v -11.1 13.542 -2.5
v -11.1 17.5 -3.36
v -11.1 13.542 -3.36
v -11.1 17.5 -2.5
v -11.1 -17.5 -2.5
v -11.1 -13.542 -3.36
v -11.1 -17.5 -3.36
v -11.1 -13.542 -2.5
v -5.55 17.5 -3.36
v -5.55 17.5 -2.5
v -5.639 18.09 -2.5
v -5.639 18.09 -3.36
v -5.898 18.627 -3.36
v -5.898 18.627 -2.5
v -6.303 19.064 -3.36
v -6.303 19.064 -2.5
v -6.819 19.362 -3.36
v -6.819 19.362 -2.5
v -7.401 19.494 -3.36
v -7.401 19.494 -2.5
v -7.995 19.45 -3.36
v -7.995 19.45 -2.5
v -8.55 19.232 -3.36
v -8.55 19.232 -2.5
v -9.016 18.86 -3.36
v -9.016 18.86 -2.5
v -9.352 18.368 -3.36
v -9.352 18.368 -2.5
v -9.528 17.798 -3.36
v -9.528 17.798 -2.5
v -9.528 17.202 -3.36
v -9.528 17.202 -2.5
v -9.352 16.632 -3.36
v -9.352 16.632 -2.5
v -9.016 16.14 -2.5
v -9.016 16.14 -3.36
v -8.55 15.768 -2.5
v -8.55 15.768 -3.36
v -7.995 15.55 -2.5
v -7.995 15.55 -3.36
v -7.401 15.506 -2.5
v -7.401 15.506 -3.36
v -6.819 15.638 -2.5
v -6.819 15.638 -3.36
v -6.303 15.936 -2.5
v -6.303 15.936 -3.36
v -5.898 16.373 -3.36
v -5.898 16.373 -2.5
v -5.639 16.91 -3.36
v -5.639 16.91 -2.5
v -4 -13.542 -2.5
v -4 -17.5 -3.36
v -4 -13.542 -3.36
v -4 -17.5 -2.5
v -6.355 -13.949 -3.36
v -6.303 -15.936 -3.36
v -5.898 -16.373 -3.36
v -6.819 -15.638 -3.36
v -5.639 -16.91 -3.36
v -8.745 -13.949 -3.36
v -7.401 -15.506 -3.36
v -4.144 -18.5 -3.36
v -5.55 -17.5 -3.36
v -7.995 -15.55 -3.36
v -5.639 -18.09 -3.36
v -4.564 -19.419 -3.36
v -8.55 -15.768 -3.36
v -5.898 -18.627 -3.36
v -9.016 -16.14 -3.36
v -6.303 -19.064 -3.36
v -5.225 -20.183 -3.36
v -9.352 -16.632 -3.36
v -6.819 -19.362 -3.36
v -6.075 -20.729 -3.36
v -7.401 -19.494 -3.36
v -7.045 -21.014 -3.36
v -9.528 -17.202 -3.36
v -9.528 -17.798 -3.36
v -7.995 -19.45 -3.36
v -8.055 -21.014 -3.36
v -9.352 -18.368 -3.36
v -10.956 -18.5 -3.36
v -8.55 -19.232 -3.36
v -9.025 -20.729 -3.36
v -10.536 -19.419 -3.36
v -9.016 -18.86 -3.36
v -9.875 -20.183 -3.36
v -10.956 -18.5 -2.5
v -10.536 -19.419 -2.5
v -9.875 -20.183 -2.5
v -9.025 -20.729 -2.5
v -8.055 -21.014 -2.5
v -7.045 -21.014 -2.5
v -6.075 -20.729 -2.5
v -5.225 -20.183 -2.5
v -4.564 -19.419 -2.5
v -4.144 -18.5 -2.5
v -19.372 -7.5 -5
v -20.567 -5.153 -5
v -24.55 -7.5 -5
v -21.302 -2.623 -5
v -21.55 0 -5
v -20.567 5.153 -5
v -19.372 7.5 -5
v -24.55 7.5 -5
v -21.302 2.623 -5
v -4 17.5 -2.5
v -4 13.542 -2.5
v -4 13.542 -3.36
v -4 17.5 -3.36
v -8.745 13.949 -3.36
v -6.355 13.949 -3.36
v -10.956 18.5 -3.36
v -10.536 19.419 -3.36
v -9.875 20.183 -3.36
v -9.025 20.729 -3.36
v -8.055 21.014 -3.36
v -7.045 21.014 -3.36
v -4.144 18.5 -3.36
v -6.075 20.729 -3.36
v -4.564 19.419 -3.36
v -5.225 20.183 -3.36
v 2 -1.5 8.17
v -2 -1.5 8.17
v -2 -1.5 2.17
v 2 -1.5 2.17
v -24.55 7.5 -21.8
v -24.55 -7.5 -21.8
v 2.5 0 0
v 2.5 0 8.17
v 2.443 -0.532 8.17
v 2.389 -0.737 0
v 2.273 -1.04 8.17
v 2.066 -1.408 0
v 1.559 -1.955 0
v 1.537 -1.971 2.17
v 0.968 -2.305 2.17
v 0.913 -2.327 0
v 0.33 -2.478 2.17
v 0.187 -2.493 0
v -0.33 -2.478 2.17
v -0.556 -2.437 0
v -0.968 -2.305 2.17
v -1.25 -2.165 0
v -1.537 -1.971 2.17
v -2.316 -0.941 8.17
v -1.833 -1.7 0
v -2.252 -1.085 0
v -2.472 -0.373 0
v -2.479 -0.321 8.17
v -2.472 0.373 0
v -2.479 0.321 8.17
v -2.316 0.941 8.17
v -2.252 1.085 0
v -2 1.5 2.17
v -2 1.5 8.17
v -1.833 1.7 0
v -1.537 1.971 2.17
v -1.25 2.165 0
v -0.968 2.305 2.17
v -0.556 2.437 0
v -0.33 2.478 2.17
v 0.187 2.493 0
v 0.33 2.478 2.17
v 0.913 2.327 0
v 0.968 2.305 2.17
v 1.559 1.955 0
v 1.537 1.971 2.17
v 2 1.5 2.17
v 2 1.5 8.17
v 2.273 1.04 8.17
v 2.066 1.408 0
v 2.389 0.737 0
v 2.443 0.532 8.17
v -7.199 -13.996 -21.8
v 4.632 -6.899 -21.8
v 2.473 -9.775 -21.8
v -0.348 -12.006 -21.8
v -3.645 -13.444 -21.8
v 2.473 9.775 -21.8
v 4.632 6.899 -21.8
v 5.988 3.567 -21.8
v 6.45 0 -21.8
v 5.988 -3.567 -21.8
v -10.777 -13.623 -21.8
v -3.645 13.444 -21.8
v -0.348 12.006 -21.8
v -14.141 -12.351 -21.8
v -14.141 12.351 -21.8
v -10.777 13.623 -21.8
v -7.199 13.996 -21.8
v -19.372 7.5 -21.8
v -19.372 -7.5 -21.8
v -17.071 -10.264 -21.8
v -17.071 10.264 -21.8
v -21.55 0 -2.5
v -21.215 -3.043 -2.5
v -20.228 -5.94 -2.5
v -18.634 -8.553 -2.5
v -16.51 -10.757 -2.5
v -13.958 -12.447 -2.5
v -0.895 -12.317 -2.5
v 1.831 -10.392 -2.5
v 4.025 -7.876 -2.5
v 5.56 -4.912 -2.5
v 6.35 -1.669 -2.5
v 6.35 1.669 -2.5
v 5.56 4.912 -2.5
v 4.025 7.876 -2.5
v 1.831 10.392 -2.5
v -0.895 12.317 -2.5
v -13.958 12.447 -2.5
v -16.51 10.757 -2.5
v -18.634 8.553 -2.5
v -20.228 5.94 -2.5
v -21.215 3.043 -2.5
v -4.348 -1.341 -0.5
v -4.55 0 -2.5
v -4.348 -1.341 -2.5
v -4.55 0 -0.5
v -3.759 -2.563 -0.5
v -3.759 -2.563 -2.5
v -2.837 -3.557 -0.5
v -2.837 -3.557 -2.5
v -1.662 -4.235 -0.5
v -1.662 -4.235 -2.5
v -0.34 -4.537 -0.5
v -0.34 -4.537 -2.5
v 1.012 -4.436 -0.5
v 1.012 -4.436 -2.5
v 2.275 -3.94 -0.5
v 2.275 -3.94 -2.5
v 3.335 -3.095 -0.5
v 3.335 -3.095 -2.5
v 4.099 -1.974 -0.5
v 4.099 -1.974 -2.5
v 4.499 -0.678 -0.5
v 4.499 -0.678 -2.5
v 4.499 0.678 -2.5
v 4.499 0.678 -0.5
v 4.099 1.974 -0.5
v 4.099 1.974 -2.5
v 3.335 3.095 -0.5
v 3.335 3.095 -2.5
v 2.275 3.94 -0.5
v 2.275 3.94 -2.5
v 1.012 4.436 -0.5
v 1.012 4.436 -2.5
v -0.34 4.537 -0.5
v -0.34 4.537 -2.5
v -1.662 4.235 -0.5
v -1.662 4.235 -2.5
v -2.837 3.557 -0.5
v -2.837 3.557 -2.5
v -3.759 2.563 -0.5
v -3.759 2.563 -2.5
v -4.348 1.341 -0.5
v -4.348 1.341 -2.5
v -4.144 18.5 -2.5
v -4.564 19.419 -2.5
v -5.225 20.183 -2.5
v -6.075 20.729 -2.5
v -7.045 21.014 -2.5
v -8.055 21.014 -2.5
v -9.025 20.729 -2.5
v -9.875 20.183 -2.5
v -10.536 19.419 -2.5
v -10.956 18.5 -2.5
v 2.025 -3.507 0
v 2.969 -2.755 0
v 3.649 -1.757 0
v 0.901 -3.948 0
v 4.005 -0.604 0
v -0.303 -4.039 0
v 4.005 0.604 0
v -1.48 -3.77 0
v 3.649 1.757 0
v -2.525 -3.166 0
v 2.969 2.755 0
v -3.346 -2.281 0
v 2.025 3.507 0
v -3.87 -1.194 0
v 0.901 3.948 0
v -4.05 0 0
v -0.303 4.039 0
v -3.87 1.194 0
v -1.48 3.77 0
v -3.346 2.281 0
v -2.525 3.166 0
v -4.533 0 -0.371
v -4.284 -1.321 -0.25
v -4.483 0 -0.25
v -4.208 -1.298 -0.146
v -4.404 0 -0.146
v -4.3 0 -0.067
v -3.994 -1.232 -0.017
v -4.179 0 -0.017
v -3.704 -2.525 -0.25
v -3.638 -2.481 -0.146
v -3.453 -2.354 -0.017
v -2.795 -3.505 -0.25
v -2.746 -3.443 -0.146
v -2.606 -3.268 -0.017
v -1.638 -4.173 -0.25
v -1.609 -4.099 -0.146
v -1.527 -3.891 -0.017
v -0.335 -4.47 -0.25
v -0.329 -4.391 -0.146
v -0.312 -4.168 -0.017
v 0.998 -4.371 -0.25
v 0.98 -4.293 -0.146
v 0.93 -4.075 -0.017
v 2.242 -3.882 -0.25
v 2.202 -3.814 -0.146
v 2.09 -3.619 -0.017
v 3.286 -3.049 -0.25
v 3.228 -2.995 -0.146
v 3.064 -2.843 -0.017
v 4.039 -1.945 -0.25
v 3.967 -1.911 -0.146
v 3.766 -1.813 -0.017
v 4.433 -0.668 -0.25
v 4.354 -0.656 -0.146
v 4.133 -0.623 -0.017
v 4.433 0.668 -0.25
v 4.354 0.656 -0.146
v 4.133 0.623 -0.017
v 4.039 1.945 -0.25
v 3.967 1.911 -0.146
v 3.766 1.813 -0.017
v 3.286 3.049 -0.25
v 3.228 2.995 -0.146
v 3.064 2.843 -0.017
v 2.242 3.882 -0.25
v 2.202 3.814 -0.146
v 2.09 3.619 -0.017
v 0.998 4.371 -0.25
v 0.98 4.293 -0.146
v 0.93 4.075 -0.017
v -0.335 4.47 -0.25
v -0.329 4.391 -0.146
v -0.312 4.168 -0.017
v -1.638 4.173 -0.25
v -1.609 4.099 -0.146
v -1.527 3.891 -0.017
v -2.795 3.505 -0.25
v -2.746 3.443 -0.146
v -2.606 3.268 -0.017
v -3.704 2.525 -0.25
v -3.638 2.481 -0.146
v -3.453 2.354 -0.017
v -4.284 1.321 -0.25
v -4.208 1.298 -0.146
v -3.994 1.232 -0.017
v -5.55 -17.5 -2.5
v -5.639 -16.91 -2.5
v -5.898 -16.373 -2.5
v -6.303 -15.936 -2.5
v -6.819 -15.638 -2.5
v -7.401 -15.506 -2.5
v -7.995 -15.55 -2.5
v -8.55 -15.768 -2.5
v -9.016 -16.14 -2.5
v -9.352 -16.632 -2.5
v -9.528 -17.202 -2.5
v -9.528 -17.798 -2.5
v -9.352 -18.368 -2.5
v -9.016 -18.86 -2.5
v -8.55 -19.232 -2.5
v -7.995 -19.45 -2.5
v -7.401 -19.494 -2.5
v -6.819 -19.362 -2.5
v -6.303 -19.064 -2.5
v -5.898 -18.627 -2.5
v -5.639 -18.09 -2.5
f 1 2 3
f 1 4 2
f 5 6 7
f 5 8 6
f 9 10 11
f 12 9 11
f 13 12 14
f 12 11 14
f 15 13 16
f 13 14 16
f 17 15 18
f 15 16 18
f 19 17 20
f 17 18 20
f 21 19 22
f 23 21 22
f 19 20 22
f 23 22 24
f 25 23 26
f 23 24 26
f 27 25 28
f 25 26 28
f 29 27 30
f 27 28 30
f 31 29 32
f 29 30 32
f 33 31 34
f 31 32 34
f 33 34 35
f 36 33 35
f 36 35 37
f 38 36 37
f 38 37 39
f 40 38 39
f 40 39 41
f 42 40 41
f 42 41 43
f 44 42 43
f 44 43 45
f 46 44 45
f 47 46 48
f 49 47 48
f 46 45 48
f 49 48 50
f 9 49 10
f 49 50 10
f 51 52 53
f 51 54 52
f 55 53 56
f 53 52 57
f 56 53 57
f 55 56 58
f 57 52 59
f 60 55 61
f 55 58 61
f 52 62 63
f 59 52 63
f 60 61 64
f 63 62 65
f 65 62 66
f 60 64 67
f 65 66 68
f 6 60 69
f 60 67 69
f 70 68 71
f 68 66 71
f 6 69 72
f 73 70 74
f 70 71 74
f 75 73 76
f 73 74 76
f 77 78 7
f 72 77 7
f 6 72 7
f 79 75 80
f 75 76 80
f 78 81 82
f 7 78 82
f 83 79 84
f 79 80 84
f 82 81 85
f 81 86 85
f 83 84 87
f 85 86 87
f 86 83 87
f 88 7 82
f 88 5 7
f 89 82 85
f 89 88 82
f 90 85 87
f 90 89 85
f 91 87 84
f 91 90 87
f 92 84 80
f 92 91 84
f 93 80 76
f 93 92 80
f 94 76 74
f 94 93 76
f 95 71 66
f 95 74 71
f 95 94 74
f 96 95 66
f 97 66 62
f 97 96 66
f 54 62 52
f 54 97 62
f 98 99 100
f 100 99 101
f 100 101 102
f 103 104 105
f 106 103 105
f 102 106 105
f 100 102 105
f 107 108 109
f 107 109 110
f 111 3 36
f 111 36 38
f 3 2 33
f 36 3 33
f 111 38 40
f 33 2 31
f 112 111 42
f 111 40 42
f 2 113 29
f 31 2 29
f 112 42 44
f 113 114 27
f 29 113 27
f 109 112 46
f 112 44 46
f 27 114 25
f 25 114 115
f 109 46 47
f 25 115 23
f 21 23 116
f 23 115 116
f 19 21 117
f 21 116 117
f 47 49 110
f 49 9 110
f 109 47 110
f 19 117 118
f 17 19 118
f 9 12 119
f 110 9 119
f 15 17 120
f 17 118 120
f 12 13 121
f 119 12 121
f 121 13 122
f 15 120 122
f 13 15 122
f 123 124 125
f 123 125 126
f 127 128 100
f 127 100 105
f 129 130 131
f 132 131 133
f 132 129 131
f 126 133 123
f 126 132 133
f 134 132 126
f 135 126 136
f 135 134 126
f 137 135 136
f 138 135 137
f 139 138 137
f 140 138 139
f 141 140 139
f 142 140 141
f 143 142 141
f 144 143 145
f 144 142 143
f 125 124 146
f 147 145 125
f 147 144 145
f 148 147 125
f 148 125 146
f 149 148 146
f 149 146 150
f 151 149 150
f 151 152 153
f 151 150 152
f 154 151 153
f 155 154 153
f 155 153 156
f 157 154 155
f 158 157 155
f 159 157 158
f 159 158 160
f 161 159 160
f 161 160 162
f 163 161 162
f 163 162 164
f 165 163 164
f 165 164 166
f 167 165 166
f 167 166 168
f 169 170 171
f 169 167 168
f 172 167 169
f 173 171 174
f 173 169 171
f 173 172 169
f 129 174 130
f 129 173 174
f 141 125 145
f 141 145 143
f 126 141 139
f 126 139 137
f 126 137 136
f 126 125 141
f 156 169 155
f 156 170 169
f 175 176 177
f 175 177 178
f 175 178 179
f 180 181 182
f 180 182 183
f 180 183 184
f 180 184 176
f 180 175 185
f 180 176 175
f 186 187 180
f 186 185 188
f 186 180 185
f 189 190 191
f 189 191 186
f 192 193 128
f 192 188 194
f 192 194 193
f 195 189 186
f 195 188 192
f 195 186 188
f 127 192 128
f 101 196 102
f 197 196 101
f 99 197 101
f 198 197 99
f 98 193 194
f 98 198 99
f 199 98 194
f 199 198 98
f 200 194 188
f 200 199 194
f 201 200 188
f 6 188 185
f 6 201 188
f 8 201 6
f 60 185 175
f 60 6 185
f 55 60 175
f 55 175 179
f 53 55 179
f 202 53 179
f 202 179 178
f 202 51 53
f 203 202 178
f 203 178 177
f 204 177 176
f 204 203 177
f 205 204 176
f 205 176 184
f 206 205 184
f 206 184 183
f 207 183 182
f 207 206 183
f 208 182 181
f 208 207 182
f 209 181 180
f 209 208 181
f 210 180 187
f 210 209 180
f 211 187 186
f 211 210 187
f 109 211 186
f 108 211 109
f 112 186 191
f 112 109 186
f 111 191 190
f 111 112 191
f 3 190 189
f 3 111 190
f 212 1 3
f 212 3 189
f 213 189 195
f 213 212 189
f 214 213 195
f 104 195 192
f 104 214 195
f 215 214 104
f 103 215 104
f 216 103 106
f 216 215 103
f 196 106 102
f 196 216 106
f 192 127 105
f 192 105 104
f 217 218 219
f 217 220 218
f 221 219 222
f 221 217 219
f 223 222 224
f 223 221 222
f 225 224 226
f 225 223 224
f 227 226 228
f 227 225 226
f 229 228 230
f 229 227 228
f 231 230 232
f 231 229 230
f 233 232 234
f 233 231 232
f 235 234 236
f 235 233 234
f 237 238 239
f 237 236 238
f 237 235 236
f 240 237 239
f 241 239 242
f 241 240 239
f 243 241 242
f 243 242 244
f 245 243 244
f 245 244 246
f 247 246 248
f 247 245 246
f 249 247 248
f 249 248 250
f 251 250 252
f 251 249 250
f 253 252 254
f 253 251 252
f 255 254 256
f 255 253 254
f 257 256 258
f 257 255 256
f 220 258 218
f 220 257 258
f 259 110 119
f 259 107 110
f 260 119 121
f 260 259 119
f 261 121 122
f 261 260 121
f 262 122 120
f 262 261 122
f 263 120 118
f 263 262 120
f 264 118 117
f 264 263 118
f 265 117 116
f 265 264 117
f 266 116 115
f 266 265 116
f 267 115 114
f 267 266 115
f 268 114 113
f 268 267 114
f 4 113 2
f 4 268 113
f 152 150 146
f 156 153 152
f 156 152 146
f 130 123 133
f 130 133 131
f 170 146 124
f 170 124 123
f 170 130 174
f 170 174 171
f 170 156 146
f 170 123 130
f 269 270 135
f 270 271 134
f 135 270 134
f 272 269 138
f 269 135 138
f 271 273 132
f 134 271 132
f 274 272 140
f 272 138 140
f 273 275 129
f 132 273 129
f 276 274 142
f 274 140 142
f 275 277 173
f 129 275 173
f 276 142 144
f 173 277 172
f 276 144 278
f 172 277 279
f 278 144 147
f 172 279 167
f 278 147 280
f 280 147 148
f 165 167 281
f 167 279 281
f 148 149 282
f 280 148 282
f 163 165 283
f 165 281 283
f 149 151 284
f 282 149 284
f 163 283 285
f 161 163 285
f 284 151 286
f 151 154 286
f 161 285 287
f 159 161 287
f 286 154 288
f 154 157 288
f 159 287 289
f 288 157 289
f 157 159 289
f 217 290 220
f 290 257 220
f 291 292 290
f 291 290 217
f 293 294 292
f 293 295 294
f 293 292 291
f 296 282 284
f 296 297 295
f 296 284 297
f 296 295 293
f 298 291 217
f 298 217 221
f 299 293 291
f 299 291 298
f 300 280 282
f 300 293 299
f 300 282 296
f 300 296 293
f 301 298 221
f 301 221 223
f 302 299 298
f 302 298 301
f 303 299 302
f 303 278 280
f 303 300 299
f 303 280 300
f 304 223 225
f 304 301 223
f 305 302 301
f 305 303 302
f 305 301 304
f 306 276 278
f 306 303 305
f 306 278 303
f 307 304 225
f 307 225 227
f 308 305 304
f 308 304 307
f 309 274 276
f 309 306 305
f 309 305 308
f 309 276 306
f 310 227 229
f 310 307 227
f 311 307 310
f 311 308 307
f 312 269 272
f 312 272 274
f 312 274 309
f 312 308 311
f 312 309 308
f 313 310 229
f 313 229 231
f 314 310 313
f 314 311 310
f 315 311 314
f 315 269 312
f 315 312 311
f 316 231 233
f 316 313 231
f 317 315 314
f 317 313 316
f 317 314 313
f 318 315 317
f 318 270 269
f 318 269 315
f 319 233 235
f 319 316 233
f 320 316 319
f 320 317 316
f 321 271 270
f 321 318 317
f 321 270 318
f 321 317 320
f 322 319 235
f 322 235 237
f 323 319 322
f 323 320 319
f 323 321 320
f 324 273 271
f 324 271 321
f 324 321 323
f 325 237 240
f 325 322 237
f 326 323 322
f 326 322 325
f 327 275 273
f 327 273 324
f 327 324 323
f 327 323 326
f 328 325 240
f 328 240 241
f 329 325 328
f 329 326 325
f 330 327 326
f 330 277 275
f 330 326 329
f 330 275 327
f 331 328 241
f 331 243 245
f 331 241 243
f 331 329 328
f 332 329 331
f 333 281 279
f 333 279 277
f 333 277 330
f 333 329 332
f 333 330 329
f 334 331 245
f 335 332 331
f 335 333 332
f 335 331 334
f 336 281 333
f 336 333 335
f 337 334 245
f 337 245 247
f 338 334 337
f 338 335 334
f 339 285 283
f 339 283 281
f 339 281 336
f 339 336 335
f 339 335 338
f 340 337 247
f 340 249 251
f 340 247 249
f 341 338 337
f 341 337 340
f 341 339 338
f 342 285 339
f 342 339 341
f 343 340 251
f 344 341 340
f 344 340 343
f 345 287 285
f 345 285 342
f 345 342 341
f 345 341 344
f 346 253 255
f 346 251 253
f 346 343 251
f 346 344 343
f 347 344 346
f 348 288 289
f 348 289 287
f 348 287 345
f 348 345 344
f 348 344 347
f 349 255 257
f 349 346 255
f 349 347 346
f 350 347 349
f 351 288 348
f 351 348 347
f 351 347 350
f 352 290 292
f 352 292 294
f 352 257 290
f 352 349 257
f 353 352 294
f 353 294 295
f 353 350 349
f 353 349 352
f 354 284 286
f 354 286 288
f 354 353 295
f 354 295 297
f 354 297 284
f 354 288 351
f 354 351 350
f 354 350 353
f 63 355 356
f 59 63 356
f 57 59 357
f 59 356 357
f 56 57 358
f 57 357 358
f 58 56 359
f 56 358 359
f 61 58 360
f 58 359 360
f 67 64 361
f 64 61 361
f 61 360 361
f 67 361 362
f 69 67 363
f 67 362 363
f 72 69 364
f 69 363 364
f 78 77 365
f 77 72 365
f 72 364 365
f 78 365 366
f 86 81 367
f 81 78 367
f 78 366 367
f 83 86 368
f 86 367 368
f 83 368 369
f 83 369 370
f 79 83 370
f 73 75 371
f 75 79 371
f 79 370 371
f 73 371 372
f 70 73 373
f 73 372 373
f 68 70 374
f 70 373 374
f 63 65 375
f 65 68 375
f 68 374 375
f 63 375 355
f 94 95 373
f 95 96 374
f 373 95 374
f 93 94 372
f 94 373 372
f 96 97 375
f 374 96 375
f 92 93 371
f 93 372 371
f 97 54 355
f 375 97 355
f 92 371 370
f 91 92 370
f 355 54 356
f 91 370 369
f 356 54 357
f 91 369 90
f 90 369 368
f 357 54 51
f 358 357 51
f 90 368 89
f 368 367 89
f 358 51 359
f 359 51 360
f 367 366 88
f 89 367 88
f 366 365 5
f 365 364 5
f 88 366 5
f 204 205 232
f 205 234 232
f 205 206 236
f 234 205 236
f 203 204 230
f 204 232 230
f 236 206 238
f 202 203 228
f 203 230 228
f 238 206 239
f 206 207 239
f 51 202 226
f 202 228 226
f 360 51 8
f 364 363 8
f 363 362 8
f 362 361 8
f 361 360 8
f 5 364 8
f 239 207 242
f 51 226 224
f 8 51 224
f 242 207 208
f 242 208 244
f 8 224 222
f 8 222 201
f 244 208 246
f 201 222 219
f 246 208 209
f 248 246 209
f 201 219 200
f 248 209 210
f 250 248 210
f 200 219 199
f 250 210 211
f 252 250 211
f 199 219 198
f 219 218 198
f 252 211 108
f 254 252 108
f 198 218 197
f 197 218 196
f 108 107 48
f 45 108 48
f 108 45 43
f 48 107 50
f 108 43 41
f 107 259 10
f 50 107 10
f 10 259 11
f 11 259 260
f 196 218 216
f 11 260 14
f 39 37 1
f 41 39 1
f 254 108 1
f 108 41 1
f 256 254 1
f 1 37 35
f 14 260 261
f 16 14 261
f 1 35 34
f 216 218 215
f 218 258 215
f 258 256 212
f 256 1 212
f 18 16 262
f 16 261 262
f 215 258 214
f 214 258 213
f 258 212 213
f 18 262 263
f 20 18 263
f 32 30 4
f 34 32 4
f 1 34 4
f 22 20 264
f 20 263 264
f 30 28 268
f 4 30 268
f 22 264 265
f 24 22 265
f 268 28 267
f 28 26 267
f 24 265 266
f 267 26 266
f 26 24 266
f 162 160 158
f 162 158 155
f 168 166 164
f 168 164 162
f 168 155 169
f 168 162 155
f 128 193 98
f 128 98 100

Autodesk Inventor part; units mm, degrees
ref_plane "XZ Plane" through (0, 0, 0) normal (0, 1, 0) x (-1, 0, 0)
ref_plane "XY Plane" through (0, 0, 0) normal (0, 0, 1) x (1, 0, 0)
sketch "Sketch1" plane through (0, 0, 0) normal (0, 0, 1) x (1, 0, 0)
  circle A0 centre (0, 0) radius 2.5
  dimension "d0" = 5
extrude "Extrusion1" add sketch "Sketch1" along normal blind 8.17
sketch "Sketch2" plane through (0, 0, 8.17) normal (0, 0, 1) x (1, 0, 0)
  circle A0 centre (0, 0) radius 2.5 construction
  circle A1 centre (0, 0) radius 2.5 construction
  line L0 (-2, -1.5) -> (2, -1.5)
  line L1 (2, -1.5) -> (2, 1.5)
  line L2 (2, 1.5) -> (-2, 1.5)
  line L3 (-2, 1.5) -> (-2, -1.5)
  line L4 (-2, -1.5) -> (2, 1.5) construction
  line L5 (2, -1.5) -> (-2, 1.5) construction
  arc A2 (-2, 1.5) -> (-2, -1.5) centre (0, 0) ccw
  arc A3 (2, 1.5) -> (-2, 1.5) centre (0, 0) ccw
  arc A4 (-2, -1.5) -> (2, -1.5) centre (0, 0) ccw
  arc A5 (2, -1.5) -> (2, 1.5) centre (0, 0) ccw
  dimension "d3" = 3
extrude "Extrusion2" cut sketch "Sketch2" against normal blind 6 contours L0 A4 | A3 L2
sketch "Sketch3" plane through (0, 0, 0) normal (0, 0, -1) x (-1, 0, 0)
  circle A0 centre (0, 0) radius 2.5 projected
  circle A1 centre (0, 0) radius 4.55
  dimension "d6" = 9.1
extrude "Extrusion3" add sketch "Sketch3" along normal blind 2.5 contours A0 | A1
sketch "Sketch4" plane through (0, 0, -2.5) normal (0, 0, -1) x (-1, 0, 0)
  circle A0 centre (7.55, 0) radius 14
  circle A1 centre (0, 0) radius 4.55 projected
  line L0 (4.55, 0) -> (-6.45, 0) construction
  dimension "d9" = 28
  dimension "d10" = 11
extrude "Extrusion4" add sketch "Sketch4" along normal blind 19.3 contours A0 | A1
fillet "Fillet1" radius 0.5 1 edges at (4.55, 0, 0)
sketch "Sketch5" plane through (-7.55, 0, -21.8) normal (0, 0, -1) x (-1, 0, 0)
  circle A0 centre (0, 0) radius 14 construction
  line L0 (11.8216, -7.5) -> (17, -7.5)
  line L1 (17, -7.5) -> (17, 7.5)
  line L2 (17, 7.5) -> (11.8216, 7.5)
  line L3 (11.8216, 7.5) -> (11.8216, -7.5)
  line L4 (11.8216, -7.5) -> (17, 7.5) construction
  line L5 (17, -7.5) -> (11.8216, 7.5) construction
  circle A1 centre (0, 0) radius 14 construction
  line L6 (17, 0) -> (-14, 0) construction
  circle A2 centre (0, 0) radius 14 construction
  point P0 (-7.55, 0)
  point P1 (14.4108, 0)
  dimension "d14" = 15
  dimension "d15" = 31
extrude "Extrusion5" add sketch "Sketch5" against normal blind 16.8
sketch "Sketch6" plane through (-7.55, 0, -2.5) normal (0, 0, 1) x (1, 0, 0)
  circle A0 centre (0, 0) radius 14 projected
  circle A1 centre (7.55, 0) radius 4.55 construction
  arc A2 (-11.8216, -7.5) -> (-11.8216, 7.5) centre (0, 0) ccw projected
  line L0 (3.55, 13.5424) -> (3.55, 17.5)
  arc A3 (3.55, 17.5) -> (-3.55, 17.5) centre (0, 17.5) ccw
  line L1 (-3.55, 17.5) -> (-3.55, 13.5424)
  circle A4 centre (0, 17.5) radius 2
  dimension "d18" = 4
  dimension "d19" = 7.1
  dimension "d20" = 17.5
extrude "Extrusion6" add sketch "Sketch6" against normal blind 0.86 contours A0 L1 A3 L0
mirror "Mirror1" about plane through (0, 0, 0) normal (0, 1, 0) of "Extrusion6"
sketch "Sketch7" plane through (0, 0, -2.5) normal (0, 0, 1) x (1, 0, 0)
  arc A0 (-4, -13.5424) -> (-4, 13.5424) centre (-7.55, 0) ccw projected
  point P0 (0, 0)
ref_plane "align plane" through (-7.55, 0, -2.5) normal (1, 0, 0) x (0, 1, 0)
properties part number "stepper motor-cheapo geared"
